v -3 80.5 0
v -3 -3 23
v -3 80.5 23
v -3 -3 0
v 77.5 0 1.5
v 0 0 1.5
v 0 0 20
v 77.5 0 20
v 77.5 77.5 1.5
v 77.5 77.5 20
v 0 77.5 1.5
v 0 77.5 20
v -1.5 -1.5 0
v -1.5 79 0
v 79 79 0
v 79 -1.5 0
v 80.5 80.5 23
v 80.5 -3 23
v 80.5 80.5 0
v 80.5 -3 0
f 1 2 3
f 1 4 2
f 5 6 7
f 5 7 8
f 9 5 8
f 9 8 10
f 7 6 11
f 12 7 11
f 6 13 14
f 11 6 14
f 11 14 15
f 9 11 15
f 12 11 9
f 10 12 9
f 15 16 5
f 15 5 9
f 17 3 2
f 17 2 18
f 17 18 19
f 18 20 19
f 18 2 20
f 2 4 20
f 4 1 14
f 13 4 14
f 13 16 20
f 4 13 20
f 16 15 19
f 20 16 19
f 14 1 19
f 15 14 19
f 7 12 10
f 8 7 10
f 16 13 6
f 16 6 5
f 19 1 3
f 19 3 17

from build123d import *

# Parameters (mm, degrees)
SKETCH_1_W      = 83.5
SKETCH_1_H      = 83.5
SKETCH_1_W_2    = 77.5
SKETCH_1_H_2    = 77.5
EXTRUDE_1_DEPTH = 20
CHAMFER_1_SIZE  = 1.5
SKETCH_2_W      = 83.5
SKETCH_2_H      = 83.5
EXTRUDE_2_DEPTH = 3


with BuildPart() as part:
    # Эскиз1 → Бобышка-Вытянуть1 (new body)
    with BuildSketch(Plane.XY):
        with Locations((38.75, 38.75)):
            Rectangle(SKETCH_1_W, SKETCH_1_H)
        with Locations((38.75, 38.75)):
            Rectangle(SKETCH_1_W_2, SKETCH_1_H_2, mode=Mode.SUBTRACT)
    extrude(amount=EXTRUDE_1_DEPTH)

    # Фаска1
    chamfer_1_edges = [part.edges().sort_by_distance(p)[0] for p in [
        (0, 38.75, 0),
        (38.75, 0, 0),
        (77.5, 38.75, 0),
        (38.75, 77.5, 0),
    ]]
    chamfer(chamfer_1_edges, length=CHAMFER_1_SIZE)

    # Эскиз2 → Бобышка-Вытянуть2 (add)
    with BuildSketch(Plane.XY.offset(20)):
        with Locations((38.75, 38.75)):
            Rectangle(SKETCH_2_W, SKETCH_2_H)
    extrude(amount=EXTRUDE_2_DEPTH)


solid = part.part
